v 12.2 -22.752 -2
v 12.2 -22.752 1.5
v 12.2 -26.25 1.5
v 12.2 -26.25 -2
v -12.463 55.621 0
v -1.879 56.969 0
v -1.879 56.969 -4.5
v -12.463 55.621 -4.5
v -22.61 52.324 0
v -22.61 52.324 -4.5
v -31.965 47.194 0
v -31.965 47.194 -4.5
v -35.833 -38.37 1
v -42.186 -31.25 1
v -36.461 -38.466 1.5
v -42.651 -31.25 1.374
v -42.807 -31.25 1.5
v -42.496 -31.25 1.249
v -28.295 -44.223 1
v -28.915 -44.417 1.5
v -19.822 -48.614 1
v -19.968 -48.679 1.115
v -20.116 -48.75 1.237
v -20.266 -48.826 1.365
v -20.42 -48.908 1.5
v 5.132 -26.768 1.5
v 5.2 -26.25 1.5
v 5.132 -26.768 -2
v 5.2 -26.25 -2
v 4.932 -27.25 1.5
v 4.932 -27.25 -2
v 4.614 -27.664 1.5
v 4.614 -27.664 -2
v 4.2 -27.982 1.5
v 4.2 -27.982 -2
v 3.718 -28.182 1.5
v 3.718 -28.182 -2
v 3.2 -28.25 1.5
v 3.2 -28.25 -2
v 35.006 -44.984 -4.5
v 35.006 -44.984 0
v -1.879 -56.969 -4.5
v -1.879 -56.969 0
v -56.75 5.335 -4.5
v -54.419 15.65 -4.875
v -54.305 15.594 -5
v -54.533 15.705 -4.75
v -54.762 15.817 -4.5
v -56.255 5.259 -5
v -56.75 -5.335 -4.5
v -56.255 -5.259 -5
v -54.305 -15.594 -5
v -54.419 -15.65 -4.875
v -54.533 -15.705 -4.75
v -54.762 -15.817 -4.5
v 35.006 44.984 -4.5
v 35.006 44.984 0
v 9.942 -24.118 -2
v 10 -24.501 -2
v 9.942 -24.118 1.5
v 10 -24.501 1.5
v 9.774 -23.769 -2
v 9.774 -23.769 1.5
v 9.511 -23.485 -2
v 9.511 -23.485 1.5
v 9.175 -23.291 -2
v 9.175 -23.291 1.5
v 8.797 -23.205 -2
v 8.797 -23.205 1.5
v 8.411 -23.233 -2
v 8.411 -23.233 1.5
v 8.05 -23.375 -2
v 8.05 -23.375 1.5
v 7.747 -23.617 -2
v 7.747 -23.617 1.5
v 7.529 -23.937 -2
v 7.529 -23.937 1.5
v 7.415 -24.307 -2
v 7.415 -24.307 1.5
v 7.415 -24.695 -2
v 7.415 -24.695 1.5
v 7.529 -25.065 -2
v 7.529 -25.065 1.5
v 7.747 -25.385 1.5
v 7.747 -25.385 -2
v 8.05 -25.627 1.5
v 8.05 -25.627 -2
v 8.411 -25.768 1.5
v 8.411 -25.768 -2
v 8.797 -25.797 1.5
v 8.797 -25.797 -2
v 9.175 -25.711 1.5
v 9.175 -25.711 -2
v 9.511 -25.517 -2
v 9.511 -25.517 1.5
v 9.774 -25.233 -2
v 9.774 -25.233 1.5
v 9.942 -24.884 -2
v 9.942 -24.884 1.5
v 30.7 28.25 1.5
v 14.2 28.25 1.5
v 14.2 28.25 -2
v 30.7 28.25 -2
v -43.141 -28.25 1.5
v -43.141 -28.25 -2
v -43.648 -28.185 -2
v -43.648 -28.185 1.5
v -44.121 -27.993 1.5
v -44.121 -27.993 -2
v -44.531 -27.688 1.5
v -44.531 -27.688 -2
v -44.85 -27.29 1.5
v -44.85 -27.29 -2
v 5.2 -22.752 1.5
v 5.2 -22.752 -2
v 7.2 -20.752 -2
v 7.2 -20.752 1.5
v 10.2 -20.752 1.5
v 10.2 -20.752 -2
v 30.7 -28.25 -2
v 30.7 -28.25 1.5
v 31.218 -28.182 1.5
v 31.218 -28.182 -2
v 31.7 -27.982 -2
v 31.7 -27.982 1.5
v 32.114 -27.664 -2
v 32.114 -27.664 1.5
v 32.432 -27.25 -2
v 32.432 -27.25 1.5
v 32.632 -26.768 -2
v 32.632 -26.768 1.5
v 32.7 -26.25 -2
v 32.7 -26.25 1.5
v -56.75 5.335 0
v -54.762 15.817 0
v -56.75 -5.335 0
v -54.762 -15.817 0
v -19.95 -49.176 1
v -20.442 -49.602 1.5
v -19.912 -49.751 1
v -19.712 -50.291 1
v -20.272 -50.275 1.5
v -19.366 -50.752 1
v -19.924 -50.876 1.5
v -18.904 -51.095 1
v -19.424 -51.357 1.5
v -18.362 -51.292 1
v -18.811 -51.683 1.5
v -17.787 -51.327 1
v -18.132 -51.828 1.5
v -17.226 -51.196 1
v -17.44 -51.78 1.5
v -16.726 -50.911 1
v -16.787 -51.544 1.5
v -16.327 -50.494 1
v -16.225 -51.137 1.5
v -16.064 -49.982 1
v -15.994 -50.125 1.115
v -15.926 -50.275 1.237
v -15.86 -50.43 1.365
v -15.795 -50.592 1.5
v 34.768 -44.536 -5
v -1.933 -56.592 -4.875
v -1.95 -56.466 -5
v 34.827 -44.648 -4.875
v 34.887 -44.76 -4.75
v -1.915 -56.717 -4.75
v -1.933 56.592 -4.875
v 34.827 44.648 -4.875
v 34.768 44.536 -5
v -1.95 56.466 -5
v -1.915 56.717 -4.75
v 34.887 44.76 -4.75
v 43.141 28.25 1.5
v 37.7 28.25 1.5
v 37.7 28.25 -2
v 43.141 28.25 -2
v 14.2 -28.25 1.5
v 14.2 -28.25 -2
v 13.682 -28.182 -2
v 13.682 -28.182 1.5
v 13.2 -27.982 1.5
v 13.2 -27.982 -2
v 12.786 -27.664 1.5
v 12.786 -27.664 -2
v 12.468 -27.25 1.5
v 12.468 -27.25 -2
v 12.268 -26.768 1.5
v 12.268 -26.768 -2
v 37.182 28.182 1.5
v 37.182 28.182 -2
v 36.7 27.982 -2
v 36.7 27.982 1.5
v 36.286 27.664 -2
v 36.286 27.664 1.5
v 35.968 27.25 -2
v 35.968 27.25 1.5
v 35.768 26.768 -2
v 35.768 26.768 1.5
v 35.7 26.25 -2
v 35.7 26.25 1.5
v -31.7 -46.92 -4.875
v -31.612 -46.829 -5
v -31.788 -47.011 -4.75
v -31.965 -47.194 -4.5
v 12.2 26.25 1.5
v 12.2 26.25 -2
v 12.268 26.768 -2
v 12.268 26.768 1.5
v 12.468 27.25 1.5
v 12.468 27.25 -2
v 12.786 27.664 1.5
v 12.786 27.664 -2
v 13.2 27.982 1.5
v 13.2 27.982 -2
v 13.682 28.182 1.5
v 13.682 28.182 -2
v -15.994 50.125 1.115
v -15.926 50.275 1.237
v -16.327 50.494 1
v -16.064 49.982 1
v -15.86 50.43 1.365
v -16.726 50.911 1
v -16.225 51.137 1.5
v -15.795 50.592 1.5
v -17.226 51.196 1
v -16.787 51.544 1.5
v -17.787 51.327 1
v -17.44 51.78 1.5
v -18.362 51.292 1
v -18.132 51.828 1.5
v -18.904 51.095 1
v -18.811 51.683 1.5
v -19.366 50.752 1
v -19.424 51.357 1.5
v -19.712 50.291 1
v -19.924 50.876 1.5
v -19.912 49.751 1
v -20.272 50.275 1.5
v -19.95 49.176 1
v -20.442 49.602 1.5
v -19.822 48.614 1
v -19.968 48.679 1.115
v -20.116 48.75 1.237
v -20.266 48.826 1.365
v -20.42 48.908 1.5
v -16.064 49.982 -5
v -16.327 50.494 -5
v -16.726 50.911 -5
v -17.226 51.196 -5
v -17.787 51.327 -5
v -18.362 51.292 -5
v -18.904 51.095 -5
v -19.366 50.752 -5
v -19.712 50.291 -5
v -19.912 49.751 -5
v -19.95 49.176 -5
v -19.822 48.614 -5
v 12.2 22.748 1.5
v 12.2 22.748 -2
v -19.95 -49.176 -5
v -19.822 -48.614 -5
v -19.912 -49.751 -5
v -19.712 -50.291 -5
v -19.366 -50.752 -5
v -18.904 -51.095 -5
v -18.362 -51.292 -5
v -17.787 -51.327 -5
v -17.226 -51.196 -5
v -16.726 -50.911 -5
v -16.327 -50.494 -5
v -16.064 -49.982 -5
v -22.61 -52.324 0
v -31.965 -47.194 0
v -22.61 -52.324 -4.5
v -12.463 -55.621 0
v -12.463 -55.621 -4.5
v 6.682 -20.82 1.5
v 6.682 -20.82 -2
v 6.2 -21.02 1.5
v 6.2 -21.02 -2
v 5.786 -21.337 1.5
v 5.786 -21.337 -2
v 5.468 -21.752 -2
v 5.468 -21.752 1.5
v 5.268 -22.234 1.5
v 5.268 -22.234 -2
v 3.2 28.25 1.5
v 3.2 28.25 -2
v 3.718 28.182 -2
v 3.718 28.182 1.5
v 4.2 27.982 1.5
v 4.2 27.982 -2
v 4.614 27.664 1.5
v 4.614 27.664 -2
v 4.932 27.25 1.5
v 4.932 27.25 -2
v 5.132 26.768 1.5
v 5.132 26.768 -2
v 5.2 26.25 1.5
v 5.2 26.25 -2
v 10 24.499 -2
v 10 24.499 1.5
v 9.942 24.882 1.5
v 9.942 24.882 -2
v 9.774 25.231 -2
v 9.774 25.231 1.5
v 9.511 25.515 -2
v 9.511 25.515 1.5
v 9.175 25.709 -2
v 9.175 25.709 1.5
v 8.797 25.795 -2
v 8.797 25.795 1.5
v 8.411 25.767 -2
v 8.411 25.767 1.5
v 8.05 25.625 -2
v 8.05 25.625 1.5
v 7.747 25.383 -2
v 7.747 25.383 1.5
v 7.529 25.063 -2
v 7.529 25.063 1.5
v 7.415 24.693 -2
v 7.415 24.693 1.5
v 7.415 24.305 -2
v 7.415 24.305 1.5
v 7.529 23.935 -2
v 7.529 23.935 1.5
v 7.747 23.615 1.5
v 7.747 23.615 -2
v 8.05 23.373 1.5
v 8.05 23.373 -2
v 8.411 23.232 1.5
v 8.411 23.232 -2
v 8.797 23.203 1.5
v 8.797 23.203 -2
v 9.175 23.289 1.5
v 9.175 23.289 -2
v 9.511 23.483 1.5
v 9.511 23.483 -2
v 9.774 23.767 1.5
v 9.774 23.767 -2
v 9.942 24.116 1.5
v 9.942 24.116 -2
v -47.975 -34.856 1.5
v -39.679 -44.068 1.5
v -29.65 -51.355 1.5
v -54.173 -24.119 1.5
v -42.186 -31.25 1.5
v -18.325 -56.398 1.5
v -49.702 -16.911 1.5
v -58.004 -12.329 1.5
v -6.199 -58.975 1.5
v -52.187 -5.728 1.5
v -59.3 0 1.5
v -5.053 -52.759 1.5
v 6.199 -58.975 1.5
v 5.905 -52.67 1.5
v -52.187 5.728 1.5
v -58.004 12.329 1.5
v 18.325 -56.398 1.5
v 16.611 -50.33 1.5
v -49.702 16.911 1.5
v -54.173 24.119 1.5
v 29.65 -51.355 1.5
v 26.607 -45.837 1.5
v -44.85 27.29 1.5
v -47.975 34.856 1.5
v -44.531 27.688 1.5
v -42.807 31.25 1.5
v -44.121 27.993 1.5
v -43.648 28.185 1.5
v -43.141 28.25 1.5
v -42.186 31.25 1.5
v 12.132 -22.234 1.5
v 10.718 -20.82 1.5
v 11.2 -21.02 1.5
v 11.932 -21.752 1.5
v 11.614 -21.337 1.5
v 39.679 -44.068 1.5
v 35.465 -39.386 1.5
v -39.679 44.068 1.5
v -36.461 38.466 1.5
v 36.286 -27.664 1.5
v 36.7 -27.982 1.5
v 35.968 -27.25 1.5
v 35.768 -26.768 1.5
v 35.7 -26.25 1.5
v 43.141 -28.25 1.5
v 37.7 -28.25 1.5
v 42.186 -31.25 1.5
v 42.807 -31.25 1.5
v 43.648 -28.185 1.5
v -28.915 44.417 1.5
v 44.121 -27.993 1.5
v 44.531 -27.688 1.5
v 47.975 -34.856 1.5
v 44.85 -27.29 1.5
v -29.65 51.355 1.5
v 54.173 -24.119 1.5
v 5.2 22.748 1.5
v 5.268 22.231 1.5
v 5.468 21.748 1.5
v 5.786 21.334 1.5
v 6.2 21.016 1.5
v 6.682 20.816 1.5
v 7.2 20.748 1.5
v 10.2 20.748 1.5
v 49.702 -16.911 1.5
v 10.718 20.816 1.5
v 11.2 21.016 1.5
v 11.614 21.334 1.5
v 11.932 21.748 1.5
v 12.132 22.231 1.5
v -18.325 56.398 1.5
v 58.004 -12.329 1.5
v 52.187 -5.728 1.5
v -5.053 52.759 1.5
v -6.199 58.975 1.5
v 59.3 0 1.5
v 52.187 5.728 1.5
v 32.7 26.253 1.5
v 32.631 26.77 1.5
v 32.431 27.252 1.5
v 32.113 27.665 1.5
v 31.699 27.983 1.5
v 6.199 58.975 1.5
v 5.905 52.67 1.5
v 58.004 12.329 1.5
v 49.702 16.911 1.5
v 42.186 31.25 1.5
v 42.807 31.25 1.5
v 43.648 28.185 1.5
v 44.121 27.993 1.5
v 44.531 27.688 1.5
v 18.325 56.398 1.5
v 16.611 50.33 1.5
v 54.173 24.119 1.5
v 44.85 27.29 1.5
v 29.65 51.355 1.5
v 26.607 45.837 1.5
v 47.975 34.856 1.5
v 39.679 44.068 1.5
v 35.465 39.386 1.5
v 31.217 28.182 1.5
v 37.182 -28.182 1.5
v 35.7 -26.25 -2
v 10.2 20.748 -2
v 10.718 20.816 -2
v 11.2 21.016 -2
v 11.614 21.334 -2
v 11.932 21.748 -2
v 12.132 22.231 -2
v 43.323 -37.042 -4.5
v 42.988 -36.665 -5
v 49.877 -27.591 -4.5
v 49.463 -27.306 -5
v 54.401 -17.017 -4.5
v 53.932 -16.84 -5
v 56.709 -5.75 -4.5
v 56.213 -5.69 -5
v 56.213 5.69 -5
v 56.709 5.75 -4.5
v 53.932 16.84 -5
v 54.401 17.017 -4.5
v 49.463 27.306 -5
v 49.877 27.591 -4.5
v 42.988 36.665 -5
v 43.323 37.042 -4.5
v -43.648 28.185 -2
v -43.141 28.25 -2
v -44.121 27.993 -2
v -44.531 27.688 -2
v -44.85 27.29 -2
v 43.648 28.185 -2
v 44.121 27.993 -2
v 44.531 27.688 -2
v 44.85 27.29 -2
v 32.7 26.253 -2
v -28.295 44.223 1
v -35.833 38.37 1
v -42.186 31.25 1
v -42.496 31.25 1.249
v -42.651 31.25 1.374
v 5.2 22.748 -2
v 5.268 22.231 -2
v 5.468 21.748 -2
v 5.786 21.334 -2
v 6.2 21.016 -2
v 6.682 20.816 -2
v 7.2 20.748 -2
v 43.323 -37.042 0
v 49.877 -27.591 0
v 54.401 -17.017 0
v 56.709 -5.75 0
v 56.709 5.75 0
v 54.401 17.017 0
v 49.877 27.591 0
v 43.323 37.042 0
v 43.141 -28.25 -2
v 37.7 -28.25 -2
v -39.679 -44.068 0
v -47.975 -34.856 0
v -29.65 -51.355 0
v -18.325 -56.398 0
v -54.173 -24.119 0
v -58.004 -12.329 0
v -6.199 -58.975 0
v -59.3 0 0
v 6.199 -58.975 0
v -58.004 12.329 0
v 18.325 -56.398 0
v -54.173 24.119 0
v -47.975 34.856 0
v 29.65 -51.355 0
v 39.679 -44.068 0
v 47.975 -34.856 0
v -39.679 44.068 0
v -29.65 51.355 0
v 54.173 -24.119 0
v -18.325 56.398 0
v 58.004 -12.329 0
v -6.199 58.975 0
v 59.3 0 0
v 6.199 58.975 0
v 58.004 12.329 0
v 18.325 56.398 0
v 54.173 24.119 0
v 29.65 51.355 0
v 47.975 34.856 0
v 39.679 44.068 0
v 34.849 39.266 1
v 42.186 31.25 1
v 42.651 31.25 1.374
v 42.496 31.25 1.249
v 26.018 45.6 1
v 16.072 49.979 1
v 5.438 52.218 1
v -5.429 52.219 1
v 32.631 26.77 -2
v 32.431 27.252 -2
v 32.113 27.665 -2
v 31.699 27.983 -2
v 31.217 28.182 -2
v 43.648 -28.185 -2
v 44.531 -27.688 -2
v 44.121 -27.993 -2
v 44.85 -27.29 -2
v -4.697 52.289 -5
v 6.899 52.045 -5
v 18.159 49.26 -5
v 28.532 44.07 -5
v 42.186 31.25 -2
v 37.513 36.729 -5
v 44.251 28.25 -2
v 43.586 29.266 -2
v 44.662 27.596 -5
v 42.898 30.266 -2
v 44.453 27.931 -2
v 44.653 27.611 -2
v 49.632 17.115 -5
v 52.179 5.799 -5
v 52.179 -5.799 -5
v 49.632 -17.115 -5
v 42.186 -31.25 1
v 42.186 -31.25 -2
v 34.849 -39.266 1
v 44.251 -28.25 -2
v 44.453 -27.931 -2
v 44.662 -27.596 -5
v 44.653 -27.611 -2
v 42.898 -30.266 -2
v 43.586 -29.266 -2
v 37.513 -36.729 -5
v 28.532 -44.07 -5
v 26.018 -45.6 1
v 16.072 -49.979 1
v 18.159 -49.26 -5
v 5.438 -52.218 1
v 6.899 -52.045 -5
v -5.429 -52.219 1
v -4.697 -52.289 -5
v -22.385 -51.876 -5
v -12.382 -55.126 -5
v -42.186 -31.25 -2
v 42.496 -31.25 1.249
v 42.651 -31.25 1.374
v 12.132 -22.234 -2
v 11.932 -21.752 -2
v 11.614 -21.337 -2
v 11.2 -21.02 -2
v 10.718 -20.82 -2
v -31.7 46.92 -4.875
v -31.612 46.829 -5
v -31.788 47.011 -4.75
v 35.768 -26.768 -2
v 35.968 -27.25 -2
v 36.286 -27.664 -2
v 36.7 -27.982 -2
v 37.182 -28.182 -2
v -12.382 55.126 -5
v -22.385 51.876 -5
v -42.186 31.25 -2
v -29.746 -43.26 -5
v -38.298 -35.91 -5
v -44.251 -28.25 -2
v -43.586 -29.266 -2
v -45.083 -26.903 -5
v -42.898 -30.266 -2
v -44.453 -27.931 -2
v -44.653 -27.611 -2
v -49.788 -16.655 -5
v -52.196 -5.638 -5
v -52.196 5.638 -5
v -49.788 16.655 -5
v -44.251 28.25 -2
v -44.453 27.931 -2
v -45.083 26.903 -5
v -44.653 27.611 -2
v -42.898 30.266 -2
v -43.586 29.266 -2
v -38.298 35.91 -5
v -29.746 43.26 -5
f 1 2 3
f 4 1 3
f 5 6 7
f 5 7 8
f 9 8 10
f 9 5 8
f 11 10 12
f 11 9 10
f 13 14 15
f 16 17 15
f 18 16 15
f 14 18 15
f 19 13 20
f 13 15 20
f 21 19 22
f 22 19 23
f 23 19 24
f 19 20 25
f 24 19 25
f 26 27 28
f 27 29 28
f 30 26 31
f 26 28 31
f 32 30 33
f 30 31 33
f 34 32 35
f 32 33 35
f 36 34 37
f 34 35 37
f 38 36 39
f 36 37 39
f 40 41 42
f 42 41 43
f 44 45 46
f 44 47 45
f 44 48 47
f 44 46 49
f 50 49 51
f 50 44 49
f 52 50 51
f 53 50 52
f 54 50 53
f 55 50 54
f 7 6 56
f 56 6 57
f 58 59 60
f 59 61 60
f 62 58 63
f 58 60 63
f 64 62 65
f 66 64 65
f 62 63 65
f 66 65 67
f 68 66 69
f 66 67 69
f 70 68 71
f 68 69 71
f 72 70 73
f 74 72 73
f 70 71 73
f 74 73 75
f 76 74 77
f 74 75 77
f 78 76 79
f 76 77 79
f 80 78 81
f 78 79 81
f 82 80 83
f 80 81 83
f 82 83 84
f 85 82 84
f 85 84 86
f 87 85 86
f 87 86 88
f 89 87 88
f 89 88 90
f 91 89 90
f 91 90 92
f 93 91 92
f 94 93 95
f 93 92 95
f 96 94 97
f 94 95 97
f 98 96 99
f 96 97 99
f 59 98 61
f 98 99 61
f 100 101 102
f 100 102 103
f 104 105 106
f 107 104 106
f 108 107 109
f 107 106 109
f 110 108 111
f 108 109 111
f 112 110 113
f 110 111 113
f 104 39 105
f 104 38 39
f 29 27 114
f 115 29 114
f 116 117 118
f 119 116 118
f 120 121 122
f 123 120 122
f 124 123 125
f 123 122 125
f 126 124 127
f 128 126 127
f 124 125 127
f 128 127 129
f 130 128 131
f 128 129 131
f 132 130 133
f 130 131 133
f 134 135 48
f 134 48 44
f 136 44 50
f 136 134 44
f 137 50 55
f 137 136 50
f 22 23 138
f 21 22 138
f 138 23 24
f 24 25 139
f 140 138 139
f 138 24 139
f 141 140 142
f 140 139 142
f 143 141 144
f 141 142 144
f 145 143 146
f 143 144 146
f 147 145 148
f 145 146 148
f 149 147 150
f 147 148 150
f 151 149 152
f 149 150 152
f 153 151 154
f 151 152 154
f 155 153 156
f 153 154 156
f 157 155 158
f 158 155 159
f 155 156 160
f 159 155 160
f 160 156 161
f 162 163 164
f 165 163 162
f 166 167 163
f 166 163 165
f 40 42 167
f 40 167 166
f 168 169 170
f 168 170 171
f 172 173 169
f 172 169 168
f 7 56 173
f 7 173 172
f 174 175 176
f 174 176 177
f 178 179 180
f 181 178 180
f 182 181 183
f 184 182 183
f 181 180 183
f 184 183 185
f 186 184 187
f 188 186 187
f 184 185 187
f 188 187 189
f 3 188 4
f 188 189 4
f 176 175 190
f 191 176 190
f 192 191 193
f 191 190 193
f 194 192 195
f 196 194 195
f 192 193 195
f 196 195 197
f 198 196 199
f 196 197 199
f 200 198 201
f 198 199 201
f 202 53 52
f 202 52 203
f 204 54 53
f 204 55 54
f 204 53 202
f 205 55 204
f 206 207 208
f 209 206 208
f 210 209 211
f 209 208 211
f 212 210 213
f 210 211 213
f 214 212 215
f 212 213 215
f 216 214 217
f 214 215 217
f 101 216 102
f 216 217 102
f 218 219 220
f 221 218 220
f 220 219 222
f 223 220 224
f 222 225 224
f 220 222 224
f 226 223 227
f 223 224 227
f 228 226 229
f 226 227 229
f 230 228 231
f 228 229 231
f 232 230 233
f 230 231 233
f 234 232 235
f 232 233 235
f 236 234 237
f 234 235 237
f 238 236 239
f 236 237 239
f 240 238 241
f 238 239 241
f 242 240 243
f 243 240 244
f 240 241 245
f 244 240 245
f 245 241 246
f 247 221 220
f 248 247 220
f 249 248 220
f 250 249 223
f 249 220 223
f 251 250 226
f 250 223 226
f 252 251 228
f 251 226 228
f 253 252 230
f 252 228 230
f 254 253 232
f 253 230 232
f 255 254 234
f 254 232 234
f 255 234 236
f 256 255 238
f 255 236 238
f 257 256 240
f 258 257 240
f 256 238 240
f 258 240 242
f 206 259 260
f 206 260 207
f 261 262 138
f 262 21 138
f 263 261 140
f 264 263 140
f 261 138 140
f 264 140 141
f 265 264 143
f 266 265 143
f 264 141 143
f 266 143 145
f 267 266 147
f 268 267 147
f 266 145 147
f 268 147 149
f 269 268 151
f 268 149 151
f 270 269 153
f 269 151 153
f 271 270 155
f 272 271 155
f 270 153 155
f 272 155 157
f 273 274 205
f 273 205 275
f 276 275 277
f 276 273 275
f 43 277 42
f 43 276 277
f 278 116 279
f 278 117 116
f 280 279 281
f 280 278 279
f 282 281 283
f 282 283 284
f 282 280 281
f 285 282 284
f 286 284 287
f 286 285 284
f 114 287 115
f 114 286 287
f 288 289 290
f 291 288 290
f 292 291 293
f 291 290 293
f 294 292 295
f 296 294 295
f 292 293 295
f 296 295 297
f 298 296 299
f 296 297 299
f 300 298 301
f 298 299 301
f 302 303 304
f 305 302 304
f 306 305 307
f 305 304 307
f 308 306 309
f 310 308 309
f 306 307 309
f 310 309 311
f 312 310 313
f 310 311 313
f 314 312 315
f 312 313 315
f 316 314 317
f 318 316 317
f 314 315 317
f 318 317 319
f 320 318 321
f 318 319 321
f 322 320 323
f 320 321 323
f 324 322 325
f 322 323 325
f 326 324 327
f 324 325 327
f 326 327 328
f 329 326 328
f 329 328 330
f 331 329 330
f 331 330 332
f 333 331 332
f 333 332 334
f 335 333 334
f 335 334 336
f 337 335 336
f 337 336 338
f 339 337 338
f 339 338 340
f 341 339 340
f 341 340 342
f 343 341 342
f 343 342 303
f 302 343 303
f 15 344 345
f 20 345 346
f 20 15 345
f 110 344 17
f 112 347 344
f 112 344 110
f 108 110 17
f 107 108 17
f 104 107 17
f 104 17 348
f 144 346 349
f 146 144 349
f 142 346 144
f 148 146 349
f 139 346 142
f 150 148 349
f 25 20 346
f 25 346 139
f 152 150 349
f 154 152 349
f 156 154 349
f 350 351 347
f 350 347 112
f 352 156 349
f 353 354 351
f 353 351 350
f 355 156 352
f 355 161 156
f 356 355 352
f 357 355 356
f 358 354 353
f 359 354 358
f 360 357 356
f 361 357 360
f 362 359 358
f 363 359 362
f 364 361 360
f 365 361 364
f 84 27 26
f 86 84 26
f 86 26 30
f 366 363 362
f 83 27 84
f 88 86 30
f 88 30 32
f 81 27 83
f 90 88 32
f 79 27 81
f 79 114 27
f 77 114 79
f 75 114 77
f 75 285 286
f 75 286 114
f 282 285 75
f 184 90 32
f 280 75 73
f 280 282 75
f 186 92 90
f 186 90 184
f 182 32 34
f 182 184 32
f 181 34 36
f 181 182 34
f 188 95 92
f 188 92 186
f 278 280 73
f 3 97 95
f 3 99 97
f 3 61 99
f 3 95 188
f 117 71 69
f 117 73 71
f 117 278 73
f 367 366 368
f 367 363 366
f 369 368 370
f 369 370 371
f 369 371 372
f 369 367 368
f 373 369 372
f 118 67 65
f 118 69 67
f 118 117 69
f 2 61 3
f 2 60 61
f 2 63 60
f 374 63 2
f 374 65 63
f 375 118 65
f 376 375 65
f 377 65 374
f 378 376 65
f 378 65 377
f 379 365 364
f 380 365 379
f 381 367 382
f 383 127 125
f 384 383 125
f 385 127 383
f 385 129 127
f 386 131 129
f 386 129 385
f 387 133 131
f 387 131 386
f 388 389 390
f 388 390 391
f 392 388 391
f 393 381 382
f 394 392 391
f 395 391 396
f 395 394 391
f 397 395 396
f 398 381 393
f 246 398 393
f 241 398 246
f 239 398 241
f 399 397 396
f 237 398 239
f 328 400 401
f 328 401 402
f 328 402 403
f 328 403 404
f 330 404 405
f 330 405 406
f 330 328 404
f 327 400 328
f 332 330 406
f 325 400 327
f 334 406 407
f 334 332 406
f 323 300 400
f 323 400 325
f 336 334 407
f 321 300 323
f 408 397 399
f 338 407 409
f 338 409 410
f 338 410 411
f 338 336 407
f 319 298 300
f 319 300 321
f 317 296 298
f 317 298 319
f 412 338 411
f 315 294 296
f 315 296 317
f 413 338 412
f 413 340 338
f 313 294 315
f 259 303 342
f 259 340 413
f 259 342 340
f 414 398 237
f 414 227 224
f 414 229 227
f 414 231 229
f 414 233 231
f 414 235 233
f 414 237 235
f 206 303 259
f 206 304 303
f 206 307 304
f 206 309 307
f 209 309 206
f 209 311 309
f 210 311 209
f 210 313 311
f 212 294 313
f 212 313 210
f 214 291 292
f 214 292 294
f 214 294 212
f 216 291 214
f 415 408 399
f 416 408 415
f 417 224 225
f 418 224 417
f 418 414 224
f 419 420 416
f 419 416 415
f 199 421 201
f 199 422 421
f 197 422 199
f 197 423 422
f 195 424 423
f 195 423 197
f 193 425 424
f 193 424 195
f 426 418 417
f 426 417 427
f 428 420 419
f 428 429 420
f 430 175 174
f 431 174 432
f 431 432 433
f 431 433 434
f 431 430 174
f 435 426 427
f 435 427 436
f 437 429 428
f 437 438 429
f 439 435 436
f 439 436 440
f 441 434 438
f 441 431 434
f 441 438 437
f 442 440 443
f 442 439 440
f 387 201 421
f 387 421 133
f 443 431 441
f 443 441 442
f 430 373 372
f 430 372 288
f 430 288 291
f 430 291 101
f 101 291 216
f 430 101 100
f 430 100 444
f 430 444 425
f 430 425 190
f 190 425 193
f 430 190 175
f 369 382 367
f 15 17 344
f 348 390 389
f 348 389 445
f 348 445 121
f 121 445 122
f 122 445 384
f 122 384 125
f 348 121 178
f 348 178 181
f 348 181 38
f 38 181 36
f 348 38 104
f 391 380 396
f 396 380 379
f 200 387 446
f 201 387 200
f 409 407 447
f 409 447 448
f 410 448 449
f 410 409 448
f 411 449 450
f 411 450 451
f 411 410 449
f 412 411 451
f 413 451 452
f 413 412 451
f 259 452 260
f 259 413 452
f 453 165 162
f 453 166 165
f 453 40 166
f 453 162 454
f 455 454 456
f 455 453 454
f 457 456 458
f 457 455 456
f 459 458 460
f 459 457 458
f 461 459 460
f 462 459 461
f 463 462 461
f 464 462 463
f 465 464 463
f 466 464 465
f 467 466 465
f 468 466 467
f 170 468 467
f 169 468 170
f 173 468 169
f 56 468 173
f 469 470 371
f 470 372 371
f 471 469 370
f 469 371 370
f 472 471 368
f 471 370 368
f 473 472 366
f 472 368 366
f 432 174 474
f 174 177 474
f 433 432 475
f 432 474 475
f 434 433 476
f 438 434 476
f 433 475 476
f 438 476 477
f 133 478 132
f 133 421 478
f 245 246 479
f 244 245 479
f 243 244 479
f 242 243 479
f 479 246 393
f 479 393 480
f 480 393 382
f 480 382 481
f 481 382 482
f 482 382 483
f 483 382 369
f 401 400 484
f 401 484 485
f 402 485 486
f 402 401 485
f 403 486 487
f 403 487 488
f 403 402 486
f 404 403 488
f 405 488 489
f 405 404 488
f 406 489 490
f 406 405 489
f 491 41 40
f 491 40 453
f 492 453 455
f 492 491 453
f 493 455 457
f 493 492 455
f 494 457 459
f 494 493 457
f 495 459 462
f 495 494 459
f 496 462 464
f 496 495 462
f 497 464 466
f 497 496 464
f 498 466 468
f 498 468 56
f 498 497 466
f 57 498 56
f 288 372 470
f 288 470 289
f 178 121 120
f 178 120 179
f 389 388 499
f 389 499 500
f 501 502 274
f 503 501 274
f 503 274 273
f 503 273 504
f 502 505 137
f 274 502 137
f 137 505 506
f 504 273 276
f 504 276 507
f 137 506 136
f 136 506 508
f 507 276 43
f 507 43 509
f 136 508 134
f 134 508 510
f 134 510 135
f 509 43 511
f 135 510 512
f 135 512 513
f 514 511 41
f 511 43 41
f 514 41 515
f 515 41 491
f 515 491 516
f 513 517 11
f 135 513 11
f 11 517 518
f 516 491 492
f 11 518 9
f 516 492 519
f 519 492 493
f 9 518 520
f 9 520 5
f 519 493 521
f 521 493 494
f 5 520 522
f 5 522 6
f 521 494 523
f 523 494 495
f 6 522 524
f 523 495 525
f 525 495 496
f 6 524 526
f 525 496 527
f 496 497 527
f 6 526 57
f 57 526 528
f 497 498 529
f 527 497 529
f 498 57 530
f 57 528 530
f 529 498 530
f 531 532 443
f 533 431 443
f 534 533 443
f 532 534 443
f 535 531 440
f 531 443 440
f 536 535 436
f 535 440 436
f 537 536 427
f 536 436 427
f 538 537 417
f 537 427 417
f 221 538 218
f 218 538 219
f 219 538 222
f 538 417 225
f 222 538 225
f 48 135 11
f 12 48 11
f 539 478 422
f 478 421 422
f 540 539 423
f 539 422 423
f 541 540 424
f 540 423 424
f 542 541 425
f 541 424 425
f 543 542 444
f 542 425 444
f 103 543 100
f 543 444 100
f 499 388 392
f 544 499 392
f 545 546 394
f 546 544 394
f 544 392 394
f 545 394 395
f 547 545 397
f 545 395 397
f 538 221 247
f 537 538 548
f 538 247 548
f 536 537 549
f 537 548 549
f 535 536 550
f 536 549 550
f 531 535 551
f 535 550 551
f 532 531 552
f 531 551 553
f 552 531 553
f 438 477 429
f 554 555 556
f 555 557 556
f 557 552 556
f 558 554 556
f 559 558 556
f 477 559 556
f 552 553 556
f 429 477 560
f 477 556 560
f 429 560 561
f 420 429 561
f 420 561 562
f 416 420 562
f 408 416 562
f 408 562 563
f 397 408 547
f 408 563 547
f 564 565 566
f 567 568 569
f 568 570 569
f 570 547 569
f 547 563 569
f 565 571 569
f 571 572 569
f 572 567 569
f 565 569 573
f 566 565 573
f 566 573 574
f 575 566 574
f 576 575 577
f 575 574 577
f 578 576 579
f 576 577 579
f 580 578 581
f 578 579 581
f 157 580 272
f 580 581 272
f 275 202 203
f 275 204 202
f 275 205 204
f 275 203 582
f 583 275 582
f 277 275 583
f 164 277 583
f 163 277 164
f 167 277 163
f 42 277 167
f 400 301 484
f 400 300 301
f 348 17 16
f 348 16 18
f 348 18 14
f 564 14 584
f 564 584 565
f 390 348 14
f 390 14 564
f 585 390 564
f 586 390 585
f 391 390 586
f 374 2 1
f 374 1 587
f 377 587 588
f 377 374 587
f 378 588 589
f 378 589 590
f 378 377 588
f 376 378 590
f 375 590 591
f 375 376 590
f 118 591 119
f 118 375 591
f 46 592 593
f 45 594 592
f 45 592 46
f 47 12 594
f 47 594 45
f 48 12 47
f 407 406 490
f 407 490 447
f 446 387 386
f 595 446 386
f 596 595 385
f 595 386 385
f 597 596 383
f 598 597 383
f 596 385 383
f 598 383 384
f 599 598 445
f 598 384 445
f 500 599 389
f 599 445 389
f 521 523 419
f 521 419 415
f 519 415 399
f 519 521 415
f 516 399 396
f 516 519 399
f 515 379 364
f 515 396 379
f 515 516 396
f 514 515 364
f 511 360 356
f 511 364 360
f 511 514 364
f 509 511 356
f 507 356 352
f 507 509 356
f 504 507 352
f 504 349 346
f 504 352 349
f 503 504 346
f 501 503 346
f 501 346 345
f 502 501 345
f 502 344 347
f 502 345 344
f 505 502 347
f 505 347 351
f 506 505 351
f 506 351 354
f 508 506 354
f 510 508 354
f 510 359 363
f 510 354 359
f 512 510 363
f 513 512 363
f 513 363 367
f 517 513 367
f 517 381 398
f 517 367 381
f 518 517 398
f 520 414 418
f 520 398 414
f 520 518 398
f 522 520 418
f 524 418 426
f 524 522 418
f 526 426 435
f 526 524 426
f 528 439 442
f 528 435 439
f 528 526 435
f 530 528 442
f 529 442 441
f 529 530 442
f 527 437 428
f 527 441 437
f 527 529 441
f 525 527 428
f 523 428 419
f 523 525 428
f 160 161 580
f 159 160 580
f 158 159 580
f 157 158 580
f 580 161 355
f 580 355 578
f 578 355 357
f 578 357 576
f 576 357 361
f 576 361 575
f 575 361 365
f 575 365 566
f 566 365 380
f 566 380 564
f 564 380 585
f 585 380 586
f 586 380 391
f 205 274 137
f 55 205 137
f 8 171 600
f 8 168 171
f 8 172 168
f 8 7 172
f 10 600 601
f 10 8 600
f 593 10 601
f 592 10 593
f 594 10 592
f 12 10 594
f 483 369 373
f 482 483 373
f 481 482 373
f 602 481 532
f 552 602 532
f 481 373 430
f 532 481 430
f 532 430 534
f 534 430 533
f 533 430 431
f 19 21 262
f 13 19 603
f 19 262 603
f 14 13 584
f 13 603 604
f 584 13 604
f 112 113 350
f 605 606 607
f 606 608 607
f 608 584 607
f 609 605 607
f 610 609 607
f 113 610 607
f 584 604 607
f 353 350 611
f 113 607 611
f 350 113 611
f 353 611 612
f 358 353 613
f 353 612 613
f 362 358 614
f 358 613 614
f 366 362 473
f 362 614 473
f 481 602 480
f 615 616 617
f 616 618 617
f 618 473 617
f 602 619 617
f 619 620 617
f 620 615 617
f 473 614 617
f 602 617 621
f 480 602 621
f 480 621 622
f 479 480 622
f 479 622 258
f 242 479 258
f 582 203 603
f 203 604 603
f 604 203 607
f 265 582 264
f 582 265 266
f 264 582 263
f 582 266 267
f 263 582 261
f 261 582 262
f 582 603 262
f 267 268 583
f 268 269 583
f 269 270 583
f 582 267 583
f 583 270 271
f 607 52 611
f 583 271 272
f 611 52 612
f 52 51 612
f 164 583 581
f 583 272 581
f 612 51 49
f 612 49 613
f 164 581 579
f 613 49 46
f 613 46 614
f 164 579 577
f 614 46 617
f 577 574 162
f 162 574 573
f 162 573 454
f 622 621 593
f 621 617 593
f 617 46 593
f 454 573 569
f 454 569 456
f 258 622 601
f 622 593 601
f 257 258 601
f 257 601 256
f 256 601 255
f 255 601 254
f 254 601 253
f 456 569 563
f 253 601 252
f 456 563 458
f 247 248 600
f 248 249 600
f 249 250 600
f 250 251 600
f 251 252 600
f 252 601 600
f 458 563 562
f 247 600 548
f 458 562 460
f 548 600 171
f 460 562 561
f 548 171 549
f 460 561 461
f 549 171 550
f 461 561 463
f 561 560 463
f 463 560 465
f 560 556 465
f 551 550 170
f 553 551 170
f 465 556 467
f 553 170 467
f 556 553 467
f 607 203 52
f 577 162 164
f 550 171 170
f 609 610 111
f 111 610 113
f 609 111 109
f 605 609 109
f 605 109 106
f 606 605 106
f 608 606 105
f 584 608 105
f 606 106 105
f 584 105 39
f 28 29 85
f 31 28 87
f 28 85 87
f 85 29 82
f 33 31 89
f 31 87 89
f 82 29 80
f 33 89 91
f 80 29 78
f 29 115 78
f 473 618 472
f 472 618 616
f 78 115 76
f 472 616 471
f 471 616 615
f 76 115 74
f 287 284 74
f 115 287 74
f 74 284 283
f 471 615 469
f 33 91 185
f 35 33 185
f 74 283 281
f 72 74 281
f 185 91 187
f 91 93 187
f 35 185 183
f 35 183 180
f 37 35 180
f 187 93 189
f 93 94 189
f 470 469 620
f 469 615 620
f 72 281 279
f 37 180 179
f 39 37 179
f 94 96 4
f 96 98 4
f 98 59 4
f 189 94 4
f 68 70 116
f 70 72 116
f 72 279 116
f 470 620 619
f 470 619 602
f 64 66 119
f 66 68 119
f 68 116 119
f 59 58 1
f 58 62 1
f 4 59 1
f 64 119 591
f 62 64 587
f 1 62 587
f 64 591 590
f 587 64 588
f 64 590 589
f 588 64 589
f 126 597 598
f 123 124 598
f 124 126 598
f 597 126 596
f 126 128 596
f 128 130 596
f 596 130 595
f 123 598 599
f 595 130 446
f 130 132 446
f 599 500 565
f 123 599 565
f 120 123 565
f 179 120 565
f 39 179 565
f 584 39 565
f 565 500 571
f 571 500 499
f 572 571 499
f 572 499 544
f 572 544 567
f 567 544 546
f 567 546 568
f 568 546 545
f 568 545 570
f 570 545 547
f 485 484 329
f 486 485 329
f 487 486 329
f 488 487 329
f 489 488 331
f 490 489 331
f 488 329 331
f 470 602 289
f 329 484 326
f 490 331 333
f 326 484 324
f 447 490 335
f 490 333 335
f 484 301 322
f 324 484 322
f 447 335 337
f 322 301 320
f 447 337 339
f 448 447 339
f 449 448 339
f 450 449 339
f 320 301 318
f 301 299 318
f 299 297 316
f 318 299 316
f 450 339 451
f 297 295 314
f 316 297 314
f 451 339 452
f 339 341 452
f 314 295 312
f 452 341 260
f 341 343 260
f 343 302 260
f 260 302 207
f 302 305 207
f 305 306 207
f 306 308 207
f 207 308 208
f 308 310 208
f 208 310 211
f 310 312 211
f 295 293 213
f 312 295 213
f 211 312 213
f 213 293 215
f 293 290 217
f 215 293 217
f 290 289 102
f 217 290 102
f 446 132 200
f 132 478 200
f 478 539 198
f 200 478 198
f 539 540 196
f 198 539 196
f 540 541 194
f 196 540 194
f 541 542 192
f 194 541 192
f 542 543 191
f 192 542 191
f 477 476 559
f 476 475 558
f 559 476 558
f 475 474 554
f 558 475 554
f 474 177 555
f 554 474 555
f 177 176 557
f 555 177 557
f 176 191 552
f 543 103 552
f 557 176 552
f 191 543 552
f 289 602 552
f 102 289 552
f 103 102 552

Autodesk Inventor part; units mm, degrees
ref_plane "YZ Plane" through (0, 0, 0) normal (1, 0, 0) x (0, 1, 0)
ref_plane "XZ Plane" through (0, 0, 0) normal (0, 1, 0) x (-1, 0, 0)
sketch "Skizze1" plane through (0, 0, 0) normal (0, 0, 1) x (1, 0, 0)
  circle A0 centre (0, 0) radius 59.3
  circle A1 centre (0, 0) radius 52.5
  circle A2 centre (0, 0) radius 53.6 construction
  line L0 (-83.17, 0) -> (83.92, 0) construction
  line L1 (35.006, -44.9842) -> (-1.8793, -56.969)
  line L2 (-54.7615, 15.817) -> (-31.9651, 47.1935)
  line L3 (-1.8793, 56.969) -> (35.006, 44.9842)
  line L4 (-31.9651, -47.1935) -> (-54.7615, -15.817)
  arc A3 (-31.9651, -47.1935) -> (-1.8793, -56.969) centre (0, 0) ccw
  arc A4 (-54.7615, 15.817) -> (-54.7615, -15.817) centre (0, 0) ccw
  arc A5 (35.006, -44.9842) -> (35.006, 44.9842) centre (0, 0) ccw
  arc A6 (-1.8793, 56.969) -> (-31.9651, 47.1935) centre (0, 0) ccw
  circle A7 centre (0, 0) radius 46.4646
  line L5 (16.5633, -50.9766) -> (0, 0) construction
  line L6 (0, 0) -> (-43.3633, -31.5053) construction
  line L7 (0, 0) -> (16.5633, 50.9766) construction
  line L8 (0, 0) -> (-43.3633, 31.5053) construction
  point P0 (60.05, 0)
  dimension "d7" = 118.6
  dimension "d100" = 105
  dimension "d108" = 107.2
  dimension "d110" = 57
  dimension "d115" = 6.0354
  dimension "d139" = 72
  dimension "d140" = 72
  dimension "d141" = 72
  dimension "d142" = 72
extrude "Extrusion3" add sketch "Skizze1" against normal blind 5 contours L1 A3 L4 A4 L2 A6 L3 A5
extrude "Extrusion4" add sketch "Skizze1" along normal blind 1.5 contours A0 | L1 A3 L4 A4 L2 A6 L3 A5
sketch "ODroidskizze" plane through (0, 0, 1.5) normal (0, 0, 1) x (1, 0, 0)
  line L0 (0, -83.02) -> (0, 83.02) construction
  line L1 (-83.02, 0) -> (83.02, 0) construction
  line L2 (8.7, -24.5009) -> (-49.3, -24.5009) construction
  line L3 (-49.3, -24.5009) -> (-49.3, 24.4991) construction
  line L4 (-49.3, 24.4991) -> (8.7, 24.4991) construction
  line L5 (8.7, 24.4991) -> (8.7, -24.5009) construction
  line L6 (8.7, -24.5009) -> (-49.3, 24.4991) construction
  line L7 (32.7, 28.25) -> (32.7, -28.25) construction
  line L8 (32.7, -28.25) -> (-53.1757, 34.4371) construction
  line L9 (-53.1757, -34.4371) -> (32.7, 28.25) construction
  line L10 (32.7, 26.253) -> (32.7, -26.25)
  line L11 (7.2, 20.7483) -> (10.2, 20.7483)
  line L12 (12.2, 22.7483) -> (12.2, 28.25)
  line L13 (5.2, 28.25) -> (5.2, 22.7483)
  line L14 (5.2, 20.7483) -> (12.2, 28.25) construction
  line L15 (12.2, 20.7483) -> (5.2, 28.25) construction
  line L16 (7.2, -20.7517) -> (10.2, -20.7517)
  line L17 (12.2, -22.7517) -> (12.2, -28.25)
  line L18 (5.2, -28.25) -> (5.2, -22.7517)
  line L19 (5.2, -20.7517) -> (12.2, -28.25) construction
  line L20 (12.2, -20.7517) -> (5.2, -28.25) construction
  arc A0 (5.2, 22.7483) -> (7.2, 20.7483) centre (7.2, 22.7483) ccw
  arc A1 (10.2, 20.7483) -> (12.2, 22.7483) centre (10.2, 22.7483) ccw
  arc A2 (12.2, -22.7517) -> (10.2, -20.7517) centre (10.2, -22.7517) ccw
  arc A3 (7.2, -20.7517) -> (5.2, -22.7517) centre (7.2, -22.7517) ccw
  arc A4 (32.7, 26.253) -> (30.7, 28.25) centre (30.7, 26.25) ccw
  arc A5 (30.7, -28.25) -> (32.7, -26.25) centre (30.7, -26.25) ccw
  line L21 (12.2, 28.25) -> (30.7, 28.25)
  line L22 (12.2, 28.25) -> (32.7, 28.25) construction
  line L23 (30.7, -28.25) -> (12.2, -28.25)
  line L24 (32.7, -28.25) -> (12.2, -28.25) construction
  circle A6 centre (0, 0) radius 59.3 projected
  line L25 (-42.1863, 31.25) -> (42.1863, 31.25)
  line L26 (-42.1863, -31.25) -> (42.1863, -31.25)
  line L27 (35.7, -26.25) -> (35.7, 26.25)
  line L28 (37.7, 28.25) -> (44.2514, 28.25)
  line L29 (44.2514, -28.25) -> (37.7, -28.25)
  arc A7 (37.7, 28.25) -> (35.7, 26.25) centre (37.7, 26.25) ccw
  arc A8 (35.7, -26.25) -> (37.7, -28.25) centre (37.7, -26.25) ccw
  circle A9 centre (8.7, 24.4991) radius 1.3
  circle A10 centre (8.7, -24.5009) radius 1.3
  circle A11 centre (0, 0) radius 52.5 projected
  line L30 (-44.2514, 28.25) -> (5.2, 28.25) construction
  line L31 (-44.2514, 28.25) -> (5.2, 28.25)
  line L32 (5.2, -28.25) -> (-44.2514, -28.25)
  line L33 (5.2, -28.25) -> (-44.2514, -28.25) construction
  point P0 (0.9483, -27.9891)
  point P1 (-20.301, 0)
  point P2 (-20.301, 0)
  point P3 (-6, 0)
  point P4 (44.0485, 0)
  point P5 (-44.8148, -28.2558)
  point P6 (44.8435, -28.25)
  point P7 (44.8435, 28.25)
  point P8 (-44.8435, -28.25)
  point P9 (53, 0)
  point P10 (-53.0251, 0)
  dimension "d30" = 49
  dimension "d31" = 58
  dimension "d38" = 6
  dimension "d39" = 7
  dimension "d40" = 7
  dimension "d69" = 3
  dimension "d70" = 2
  dimension "d114" = 5.2
  dimension "d134" = 62.5
  dimension "d135" = 2.6
  dimension "d136" = 2.6
extrude "Extrusion5" add sketch "ODroidskizze" against normal blind 3.5 contours A4 L21 L12 A1 L11 A0 L13 L31 A11 L25 L28 A7 L27 A8 L29 L26 L32 L18 A3 L16 A2 L17 L23 A5 L10
ref_plane "Arbeitsebene1" through (0, 0, -1) normal (0, 0, 1) x (1, 0, 0)
sketch "Skizze8" plane through (0, 0, 1.5) normal (0, 0, 1) x (1, 0, 0)
  arc A0 (42.1863, 31.25) -> (-42.1863, 31.25) centre (0, 0) ccw construction
  arc A1 (-42.1863, -31.25) -> (42.1863, -31.25) centre (0, 0) ccw construction
  circle A2 centre (-17.9561, -49.3339) radius 2
  circle A3 centre (-17.9561, 49.3339) radius 2
  line L0 (-83.02, 0) -> (83.02, 0) construction
  line L1 (-17.9561, -49.3339) -> (0, 0) construction
  line L2 (0, 0) -> (-17.9561, 49.3339) construction
  dimension "d116" = 4
  dimension "d117" = 4
  dimension "d143" = 70
  dimension "d144" = 70
extrude "Lidar-Holder-Nose" cut sketch "Skizze8" against normal up to next
chamfer "Fase5" distance 0.5 angle 45 14 edges at (-43.3633, -31.5053, -5) (-57, 0, -5) (-17.614, -54.2102, -5) (-43.3633, 31.5053, -5) (-17.614, 54.2102, -5) (16.5633, 50.9766, -5) (57, 0, -5) (16.5633, -50.9766, -5) (-32.1969, -41.4682, 1.5) (16.0722, -49.9793, 1.5) (16.0722, 49.9793, 1.5) (-32.1969, 41.4682, 1.5) (-18.6401, 51.2132, 1.5) (-18.6401, -51.2132, 1.5)
fillet "Rundung4" radius 2 8 edges at (-44.2514, -28.25, -0.25) (44.2514, -28.25, -0.25) (44.2514, 28.25, -0.25) (-44.2514, 28.25, -0.25) (12.2, 28.25, -0.25) (5.2, 28.25, -0.25) (5.2, -28.25, -0.25) (12.2, -28.25, -0.25)
properties part number "ODroid Holder-40x" material "Kupfer, Guss"
